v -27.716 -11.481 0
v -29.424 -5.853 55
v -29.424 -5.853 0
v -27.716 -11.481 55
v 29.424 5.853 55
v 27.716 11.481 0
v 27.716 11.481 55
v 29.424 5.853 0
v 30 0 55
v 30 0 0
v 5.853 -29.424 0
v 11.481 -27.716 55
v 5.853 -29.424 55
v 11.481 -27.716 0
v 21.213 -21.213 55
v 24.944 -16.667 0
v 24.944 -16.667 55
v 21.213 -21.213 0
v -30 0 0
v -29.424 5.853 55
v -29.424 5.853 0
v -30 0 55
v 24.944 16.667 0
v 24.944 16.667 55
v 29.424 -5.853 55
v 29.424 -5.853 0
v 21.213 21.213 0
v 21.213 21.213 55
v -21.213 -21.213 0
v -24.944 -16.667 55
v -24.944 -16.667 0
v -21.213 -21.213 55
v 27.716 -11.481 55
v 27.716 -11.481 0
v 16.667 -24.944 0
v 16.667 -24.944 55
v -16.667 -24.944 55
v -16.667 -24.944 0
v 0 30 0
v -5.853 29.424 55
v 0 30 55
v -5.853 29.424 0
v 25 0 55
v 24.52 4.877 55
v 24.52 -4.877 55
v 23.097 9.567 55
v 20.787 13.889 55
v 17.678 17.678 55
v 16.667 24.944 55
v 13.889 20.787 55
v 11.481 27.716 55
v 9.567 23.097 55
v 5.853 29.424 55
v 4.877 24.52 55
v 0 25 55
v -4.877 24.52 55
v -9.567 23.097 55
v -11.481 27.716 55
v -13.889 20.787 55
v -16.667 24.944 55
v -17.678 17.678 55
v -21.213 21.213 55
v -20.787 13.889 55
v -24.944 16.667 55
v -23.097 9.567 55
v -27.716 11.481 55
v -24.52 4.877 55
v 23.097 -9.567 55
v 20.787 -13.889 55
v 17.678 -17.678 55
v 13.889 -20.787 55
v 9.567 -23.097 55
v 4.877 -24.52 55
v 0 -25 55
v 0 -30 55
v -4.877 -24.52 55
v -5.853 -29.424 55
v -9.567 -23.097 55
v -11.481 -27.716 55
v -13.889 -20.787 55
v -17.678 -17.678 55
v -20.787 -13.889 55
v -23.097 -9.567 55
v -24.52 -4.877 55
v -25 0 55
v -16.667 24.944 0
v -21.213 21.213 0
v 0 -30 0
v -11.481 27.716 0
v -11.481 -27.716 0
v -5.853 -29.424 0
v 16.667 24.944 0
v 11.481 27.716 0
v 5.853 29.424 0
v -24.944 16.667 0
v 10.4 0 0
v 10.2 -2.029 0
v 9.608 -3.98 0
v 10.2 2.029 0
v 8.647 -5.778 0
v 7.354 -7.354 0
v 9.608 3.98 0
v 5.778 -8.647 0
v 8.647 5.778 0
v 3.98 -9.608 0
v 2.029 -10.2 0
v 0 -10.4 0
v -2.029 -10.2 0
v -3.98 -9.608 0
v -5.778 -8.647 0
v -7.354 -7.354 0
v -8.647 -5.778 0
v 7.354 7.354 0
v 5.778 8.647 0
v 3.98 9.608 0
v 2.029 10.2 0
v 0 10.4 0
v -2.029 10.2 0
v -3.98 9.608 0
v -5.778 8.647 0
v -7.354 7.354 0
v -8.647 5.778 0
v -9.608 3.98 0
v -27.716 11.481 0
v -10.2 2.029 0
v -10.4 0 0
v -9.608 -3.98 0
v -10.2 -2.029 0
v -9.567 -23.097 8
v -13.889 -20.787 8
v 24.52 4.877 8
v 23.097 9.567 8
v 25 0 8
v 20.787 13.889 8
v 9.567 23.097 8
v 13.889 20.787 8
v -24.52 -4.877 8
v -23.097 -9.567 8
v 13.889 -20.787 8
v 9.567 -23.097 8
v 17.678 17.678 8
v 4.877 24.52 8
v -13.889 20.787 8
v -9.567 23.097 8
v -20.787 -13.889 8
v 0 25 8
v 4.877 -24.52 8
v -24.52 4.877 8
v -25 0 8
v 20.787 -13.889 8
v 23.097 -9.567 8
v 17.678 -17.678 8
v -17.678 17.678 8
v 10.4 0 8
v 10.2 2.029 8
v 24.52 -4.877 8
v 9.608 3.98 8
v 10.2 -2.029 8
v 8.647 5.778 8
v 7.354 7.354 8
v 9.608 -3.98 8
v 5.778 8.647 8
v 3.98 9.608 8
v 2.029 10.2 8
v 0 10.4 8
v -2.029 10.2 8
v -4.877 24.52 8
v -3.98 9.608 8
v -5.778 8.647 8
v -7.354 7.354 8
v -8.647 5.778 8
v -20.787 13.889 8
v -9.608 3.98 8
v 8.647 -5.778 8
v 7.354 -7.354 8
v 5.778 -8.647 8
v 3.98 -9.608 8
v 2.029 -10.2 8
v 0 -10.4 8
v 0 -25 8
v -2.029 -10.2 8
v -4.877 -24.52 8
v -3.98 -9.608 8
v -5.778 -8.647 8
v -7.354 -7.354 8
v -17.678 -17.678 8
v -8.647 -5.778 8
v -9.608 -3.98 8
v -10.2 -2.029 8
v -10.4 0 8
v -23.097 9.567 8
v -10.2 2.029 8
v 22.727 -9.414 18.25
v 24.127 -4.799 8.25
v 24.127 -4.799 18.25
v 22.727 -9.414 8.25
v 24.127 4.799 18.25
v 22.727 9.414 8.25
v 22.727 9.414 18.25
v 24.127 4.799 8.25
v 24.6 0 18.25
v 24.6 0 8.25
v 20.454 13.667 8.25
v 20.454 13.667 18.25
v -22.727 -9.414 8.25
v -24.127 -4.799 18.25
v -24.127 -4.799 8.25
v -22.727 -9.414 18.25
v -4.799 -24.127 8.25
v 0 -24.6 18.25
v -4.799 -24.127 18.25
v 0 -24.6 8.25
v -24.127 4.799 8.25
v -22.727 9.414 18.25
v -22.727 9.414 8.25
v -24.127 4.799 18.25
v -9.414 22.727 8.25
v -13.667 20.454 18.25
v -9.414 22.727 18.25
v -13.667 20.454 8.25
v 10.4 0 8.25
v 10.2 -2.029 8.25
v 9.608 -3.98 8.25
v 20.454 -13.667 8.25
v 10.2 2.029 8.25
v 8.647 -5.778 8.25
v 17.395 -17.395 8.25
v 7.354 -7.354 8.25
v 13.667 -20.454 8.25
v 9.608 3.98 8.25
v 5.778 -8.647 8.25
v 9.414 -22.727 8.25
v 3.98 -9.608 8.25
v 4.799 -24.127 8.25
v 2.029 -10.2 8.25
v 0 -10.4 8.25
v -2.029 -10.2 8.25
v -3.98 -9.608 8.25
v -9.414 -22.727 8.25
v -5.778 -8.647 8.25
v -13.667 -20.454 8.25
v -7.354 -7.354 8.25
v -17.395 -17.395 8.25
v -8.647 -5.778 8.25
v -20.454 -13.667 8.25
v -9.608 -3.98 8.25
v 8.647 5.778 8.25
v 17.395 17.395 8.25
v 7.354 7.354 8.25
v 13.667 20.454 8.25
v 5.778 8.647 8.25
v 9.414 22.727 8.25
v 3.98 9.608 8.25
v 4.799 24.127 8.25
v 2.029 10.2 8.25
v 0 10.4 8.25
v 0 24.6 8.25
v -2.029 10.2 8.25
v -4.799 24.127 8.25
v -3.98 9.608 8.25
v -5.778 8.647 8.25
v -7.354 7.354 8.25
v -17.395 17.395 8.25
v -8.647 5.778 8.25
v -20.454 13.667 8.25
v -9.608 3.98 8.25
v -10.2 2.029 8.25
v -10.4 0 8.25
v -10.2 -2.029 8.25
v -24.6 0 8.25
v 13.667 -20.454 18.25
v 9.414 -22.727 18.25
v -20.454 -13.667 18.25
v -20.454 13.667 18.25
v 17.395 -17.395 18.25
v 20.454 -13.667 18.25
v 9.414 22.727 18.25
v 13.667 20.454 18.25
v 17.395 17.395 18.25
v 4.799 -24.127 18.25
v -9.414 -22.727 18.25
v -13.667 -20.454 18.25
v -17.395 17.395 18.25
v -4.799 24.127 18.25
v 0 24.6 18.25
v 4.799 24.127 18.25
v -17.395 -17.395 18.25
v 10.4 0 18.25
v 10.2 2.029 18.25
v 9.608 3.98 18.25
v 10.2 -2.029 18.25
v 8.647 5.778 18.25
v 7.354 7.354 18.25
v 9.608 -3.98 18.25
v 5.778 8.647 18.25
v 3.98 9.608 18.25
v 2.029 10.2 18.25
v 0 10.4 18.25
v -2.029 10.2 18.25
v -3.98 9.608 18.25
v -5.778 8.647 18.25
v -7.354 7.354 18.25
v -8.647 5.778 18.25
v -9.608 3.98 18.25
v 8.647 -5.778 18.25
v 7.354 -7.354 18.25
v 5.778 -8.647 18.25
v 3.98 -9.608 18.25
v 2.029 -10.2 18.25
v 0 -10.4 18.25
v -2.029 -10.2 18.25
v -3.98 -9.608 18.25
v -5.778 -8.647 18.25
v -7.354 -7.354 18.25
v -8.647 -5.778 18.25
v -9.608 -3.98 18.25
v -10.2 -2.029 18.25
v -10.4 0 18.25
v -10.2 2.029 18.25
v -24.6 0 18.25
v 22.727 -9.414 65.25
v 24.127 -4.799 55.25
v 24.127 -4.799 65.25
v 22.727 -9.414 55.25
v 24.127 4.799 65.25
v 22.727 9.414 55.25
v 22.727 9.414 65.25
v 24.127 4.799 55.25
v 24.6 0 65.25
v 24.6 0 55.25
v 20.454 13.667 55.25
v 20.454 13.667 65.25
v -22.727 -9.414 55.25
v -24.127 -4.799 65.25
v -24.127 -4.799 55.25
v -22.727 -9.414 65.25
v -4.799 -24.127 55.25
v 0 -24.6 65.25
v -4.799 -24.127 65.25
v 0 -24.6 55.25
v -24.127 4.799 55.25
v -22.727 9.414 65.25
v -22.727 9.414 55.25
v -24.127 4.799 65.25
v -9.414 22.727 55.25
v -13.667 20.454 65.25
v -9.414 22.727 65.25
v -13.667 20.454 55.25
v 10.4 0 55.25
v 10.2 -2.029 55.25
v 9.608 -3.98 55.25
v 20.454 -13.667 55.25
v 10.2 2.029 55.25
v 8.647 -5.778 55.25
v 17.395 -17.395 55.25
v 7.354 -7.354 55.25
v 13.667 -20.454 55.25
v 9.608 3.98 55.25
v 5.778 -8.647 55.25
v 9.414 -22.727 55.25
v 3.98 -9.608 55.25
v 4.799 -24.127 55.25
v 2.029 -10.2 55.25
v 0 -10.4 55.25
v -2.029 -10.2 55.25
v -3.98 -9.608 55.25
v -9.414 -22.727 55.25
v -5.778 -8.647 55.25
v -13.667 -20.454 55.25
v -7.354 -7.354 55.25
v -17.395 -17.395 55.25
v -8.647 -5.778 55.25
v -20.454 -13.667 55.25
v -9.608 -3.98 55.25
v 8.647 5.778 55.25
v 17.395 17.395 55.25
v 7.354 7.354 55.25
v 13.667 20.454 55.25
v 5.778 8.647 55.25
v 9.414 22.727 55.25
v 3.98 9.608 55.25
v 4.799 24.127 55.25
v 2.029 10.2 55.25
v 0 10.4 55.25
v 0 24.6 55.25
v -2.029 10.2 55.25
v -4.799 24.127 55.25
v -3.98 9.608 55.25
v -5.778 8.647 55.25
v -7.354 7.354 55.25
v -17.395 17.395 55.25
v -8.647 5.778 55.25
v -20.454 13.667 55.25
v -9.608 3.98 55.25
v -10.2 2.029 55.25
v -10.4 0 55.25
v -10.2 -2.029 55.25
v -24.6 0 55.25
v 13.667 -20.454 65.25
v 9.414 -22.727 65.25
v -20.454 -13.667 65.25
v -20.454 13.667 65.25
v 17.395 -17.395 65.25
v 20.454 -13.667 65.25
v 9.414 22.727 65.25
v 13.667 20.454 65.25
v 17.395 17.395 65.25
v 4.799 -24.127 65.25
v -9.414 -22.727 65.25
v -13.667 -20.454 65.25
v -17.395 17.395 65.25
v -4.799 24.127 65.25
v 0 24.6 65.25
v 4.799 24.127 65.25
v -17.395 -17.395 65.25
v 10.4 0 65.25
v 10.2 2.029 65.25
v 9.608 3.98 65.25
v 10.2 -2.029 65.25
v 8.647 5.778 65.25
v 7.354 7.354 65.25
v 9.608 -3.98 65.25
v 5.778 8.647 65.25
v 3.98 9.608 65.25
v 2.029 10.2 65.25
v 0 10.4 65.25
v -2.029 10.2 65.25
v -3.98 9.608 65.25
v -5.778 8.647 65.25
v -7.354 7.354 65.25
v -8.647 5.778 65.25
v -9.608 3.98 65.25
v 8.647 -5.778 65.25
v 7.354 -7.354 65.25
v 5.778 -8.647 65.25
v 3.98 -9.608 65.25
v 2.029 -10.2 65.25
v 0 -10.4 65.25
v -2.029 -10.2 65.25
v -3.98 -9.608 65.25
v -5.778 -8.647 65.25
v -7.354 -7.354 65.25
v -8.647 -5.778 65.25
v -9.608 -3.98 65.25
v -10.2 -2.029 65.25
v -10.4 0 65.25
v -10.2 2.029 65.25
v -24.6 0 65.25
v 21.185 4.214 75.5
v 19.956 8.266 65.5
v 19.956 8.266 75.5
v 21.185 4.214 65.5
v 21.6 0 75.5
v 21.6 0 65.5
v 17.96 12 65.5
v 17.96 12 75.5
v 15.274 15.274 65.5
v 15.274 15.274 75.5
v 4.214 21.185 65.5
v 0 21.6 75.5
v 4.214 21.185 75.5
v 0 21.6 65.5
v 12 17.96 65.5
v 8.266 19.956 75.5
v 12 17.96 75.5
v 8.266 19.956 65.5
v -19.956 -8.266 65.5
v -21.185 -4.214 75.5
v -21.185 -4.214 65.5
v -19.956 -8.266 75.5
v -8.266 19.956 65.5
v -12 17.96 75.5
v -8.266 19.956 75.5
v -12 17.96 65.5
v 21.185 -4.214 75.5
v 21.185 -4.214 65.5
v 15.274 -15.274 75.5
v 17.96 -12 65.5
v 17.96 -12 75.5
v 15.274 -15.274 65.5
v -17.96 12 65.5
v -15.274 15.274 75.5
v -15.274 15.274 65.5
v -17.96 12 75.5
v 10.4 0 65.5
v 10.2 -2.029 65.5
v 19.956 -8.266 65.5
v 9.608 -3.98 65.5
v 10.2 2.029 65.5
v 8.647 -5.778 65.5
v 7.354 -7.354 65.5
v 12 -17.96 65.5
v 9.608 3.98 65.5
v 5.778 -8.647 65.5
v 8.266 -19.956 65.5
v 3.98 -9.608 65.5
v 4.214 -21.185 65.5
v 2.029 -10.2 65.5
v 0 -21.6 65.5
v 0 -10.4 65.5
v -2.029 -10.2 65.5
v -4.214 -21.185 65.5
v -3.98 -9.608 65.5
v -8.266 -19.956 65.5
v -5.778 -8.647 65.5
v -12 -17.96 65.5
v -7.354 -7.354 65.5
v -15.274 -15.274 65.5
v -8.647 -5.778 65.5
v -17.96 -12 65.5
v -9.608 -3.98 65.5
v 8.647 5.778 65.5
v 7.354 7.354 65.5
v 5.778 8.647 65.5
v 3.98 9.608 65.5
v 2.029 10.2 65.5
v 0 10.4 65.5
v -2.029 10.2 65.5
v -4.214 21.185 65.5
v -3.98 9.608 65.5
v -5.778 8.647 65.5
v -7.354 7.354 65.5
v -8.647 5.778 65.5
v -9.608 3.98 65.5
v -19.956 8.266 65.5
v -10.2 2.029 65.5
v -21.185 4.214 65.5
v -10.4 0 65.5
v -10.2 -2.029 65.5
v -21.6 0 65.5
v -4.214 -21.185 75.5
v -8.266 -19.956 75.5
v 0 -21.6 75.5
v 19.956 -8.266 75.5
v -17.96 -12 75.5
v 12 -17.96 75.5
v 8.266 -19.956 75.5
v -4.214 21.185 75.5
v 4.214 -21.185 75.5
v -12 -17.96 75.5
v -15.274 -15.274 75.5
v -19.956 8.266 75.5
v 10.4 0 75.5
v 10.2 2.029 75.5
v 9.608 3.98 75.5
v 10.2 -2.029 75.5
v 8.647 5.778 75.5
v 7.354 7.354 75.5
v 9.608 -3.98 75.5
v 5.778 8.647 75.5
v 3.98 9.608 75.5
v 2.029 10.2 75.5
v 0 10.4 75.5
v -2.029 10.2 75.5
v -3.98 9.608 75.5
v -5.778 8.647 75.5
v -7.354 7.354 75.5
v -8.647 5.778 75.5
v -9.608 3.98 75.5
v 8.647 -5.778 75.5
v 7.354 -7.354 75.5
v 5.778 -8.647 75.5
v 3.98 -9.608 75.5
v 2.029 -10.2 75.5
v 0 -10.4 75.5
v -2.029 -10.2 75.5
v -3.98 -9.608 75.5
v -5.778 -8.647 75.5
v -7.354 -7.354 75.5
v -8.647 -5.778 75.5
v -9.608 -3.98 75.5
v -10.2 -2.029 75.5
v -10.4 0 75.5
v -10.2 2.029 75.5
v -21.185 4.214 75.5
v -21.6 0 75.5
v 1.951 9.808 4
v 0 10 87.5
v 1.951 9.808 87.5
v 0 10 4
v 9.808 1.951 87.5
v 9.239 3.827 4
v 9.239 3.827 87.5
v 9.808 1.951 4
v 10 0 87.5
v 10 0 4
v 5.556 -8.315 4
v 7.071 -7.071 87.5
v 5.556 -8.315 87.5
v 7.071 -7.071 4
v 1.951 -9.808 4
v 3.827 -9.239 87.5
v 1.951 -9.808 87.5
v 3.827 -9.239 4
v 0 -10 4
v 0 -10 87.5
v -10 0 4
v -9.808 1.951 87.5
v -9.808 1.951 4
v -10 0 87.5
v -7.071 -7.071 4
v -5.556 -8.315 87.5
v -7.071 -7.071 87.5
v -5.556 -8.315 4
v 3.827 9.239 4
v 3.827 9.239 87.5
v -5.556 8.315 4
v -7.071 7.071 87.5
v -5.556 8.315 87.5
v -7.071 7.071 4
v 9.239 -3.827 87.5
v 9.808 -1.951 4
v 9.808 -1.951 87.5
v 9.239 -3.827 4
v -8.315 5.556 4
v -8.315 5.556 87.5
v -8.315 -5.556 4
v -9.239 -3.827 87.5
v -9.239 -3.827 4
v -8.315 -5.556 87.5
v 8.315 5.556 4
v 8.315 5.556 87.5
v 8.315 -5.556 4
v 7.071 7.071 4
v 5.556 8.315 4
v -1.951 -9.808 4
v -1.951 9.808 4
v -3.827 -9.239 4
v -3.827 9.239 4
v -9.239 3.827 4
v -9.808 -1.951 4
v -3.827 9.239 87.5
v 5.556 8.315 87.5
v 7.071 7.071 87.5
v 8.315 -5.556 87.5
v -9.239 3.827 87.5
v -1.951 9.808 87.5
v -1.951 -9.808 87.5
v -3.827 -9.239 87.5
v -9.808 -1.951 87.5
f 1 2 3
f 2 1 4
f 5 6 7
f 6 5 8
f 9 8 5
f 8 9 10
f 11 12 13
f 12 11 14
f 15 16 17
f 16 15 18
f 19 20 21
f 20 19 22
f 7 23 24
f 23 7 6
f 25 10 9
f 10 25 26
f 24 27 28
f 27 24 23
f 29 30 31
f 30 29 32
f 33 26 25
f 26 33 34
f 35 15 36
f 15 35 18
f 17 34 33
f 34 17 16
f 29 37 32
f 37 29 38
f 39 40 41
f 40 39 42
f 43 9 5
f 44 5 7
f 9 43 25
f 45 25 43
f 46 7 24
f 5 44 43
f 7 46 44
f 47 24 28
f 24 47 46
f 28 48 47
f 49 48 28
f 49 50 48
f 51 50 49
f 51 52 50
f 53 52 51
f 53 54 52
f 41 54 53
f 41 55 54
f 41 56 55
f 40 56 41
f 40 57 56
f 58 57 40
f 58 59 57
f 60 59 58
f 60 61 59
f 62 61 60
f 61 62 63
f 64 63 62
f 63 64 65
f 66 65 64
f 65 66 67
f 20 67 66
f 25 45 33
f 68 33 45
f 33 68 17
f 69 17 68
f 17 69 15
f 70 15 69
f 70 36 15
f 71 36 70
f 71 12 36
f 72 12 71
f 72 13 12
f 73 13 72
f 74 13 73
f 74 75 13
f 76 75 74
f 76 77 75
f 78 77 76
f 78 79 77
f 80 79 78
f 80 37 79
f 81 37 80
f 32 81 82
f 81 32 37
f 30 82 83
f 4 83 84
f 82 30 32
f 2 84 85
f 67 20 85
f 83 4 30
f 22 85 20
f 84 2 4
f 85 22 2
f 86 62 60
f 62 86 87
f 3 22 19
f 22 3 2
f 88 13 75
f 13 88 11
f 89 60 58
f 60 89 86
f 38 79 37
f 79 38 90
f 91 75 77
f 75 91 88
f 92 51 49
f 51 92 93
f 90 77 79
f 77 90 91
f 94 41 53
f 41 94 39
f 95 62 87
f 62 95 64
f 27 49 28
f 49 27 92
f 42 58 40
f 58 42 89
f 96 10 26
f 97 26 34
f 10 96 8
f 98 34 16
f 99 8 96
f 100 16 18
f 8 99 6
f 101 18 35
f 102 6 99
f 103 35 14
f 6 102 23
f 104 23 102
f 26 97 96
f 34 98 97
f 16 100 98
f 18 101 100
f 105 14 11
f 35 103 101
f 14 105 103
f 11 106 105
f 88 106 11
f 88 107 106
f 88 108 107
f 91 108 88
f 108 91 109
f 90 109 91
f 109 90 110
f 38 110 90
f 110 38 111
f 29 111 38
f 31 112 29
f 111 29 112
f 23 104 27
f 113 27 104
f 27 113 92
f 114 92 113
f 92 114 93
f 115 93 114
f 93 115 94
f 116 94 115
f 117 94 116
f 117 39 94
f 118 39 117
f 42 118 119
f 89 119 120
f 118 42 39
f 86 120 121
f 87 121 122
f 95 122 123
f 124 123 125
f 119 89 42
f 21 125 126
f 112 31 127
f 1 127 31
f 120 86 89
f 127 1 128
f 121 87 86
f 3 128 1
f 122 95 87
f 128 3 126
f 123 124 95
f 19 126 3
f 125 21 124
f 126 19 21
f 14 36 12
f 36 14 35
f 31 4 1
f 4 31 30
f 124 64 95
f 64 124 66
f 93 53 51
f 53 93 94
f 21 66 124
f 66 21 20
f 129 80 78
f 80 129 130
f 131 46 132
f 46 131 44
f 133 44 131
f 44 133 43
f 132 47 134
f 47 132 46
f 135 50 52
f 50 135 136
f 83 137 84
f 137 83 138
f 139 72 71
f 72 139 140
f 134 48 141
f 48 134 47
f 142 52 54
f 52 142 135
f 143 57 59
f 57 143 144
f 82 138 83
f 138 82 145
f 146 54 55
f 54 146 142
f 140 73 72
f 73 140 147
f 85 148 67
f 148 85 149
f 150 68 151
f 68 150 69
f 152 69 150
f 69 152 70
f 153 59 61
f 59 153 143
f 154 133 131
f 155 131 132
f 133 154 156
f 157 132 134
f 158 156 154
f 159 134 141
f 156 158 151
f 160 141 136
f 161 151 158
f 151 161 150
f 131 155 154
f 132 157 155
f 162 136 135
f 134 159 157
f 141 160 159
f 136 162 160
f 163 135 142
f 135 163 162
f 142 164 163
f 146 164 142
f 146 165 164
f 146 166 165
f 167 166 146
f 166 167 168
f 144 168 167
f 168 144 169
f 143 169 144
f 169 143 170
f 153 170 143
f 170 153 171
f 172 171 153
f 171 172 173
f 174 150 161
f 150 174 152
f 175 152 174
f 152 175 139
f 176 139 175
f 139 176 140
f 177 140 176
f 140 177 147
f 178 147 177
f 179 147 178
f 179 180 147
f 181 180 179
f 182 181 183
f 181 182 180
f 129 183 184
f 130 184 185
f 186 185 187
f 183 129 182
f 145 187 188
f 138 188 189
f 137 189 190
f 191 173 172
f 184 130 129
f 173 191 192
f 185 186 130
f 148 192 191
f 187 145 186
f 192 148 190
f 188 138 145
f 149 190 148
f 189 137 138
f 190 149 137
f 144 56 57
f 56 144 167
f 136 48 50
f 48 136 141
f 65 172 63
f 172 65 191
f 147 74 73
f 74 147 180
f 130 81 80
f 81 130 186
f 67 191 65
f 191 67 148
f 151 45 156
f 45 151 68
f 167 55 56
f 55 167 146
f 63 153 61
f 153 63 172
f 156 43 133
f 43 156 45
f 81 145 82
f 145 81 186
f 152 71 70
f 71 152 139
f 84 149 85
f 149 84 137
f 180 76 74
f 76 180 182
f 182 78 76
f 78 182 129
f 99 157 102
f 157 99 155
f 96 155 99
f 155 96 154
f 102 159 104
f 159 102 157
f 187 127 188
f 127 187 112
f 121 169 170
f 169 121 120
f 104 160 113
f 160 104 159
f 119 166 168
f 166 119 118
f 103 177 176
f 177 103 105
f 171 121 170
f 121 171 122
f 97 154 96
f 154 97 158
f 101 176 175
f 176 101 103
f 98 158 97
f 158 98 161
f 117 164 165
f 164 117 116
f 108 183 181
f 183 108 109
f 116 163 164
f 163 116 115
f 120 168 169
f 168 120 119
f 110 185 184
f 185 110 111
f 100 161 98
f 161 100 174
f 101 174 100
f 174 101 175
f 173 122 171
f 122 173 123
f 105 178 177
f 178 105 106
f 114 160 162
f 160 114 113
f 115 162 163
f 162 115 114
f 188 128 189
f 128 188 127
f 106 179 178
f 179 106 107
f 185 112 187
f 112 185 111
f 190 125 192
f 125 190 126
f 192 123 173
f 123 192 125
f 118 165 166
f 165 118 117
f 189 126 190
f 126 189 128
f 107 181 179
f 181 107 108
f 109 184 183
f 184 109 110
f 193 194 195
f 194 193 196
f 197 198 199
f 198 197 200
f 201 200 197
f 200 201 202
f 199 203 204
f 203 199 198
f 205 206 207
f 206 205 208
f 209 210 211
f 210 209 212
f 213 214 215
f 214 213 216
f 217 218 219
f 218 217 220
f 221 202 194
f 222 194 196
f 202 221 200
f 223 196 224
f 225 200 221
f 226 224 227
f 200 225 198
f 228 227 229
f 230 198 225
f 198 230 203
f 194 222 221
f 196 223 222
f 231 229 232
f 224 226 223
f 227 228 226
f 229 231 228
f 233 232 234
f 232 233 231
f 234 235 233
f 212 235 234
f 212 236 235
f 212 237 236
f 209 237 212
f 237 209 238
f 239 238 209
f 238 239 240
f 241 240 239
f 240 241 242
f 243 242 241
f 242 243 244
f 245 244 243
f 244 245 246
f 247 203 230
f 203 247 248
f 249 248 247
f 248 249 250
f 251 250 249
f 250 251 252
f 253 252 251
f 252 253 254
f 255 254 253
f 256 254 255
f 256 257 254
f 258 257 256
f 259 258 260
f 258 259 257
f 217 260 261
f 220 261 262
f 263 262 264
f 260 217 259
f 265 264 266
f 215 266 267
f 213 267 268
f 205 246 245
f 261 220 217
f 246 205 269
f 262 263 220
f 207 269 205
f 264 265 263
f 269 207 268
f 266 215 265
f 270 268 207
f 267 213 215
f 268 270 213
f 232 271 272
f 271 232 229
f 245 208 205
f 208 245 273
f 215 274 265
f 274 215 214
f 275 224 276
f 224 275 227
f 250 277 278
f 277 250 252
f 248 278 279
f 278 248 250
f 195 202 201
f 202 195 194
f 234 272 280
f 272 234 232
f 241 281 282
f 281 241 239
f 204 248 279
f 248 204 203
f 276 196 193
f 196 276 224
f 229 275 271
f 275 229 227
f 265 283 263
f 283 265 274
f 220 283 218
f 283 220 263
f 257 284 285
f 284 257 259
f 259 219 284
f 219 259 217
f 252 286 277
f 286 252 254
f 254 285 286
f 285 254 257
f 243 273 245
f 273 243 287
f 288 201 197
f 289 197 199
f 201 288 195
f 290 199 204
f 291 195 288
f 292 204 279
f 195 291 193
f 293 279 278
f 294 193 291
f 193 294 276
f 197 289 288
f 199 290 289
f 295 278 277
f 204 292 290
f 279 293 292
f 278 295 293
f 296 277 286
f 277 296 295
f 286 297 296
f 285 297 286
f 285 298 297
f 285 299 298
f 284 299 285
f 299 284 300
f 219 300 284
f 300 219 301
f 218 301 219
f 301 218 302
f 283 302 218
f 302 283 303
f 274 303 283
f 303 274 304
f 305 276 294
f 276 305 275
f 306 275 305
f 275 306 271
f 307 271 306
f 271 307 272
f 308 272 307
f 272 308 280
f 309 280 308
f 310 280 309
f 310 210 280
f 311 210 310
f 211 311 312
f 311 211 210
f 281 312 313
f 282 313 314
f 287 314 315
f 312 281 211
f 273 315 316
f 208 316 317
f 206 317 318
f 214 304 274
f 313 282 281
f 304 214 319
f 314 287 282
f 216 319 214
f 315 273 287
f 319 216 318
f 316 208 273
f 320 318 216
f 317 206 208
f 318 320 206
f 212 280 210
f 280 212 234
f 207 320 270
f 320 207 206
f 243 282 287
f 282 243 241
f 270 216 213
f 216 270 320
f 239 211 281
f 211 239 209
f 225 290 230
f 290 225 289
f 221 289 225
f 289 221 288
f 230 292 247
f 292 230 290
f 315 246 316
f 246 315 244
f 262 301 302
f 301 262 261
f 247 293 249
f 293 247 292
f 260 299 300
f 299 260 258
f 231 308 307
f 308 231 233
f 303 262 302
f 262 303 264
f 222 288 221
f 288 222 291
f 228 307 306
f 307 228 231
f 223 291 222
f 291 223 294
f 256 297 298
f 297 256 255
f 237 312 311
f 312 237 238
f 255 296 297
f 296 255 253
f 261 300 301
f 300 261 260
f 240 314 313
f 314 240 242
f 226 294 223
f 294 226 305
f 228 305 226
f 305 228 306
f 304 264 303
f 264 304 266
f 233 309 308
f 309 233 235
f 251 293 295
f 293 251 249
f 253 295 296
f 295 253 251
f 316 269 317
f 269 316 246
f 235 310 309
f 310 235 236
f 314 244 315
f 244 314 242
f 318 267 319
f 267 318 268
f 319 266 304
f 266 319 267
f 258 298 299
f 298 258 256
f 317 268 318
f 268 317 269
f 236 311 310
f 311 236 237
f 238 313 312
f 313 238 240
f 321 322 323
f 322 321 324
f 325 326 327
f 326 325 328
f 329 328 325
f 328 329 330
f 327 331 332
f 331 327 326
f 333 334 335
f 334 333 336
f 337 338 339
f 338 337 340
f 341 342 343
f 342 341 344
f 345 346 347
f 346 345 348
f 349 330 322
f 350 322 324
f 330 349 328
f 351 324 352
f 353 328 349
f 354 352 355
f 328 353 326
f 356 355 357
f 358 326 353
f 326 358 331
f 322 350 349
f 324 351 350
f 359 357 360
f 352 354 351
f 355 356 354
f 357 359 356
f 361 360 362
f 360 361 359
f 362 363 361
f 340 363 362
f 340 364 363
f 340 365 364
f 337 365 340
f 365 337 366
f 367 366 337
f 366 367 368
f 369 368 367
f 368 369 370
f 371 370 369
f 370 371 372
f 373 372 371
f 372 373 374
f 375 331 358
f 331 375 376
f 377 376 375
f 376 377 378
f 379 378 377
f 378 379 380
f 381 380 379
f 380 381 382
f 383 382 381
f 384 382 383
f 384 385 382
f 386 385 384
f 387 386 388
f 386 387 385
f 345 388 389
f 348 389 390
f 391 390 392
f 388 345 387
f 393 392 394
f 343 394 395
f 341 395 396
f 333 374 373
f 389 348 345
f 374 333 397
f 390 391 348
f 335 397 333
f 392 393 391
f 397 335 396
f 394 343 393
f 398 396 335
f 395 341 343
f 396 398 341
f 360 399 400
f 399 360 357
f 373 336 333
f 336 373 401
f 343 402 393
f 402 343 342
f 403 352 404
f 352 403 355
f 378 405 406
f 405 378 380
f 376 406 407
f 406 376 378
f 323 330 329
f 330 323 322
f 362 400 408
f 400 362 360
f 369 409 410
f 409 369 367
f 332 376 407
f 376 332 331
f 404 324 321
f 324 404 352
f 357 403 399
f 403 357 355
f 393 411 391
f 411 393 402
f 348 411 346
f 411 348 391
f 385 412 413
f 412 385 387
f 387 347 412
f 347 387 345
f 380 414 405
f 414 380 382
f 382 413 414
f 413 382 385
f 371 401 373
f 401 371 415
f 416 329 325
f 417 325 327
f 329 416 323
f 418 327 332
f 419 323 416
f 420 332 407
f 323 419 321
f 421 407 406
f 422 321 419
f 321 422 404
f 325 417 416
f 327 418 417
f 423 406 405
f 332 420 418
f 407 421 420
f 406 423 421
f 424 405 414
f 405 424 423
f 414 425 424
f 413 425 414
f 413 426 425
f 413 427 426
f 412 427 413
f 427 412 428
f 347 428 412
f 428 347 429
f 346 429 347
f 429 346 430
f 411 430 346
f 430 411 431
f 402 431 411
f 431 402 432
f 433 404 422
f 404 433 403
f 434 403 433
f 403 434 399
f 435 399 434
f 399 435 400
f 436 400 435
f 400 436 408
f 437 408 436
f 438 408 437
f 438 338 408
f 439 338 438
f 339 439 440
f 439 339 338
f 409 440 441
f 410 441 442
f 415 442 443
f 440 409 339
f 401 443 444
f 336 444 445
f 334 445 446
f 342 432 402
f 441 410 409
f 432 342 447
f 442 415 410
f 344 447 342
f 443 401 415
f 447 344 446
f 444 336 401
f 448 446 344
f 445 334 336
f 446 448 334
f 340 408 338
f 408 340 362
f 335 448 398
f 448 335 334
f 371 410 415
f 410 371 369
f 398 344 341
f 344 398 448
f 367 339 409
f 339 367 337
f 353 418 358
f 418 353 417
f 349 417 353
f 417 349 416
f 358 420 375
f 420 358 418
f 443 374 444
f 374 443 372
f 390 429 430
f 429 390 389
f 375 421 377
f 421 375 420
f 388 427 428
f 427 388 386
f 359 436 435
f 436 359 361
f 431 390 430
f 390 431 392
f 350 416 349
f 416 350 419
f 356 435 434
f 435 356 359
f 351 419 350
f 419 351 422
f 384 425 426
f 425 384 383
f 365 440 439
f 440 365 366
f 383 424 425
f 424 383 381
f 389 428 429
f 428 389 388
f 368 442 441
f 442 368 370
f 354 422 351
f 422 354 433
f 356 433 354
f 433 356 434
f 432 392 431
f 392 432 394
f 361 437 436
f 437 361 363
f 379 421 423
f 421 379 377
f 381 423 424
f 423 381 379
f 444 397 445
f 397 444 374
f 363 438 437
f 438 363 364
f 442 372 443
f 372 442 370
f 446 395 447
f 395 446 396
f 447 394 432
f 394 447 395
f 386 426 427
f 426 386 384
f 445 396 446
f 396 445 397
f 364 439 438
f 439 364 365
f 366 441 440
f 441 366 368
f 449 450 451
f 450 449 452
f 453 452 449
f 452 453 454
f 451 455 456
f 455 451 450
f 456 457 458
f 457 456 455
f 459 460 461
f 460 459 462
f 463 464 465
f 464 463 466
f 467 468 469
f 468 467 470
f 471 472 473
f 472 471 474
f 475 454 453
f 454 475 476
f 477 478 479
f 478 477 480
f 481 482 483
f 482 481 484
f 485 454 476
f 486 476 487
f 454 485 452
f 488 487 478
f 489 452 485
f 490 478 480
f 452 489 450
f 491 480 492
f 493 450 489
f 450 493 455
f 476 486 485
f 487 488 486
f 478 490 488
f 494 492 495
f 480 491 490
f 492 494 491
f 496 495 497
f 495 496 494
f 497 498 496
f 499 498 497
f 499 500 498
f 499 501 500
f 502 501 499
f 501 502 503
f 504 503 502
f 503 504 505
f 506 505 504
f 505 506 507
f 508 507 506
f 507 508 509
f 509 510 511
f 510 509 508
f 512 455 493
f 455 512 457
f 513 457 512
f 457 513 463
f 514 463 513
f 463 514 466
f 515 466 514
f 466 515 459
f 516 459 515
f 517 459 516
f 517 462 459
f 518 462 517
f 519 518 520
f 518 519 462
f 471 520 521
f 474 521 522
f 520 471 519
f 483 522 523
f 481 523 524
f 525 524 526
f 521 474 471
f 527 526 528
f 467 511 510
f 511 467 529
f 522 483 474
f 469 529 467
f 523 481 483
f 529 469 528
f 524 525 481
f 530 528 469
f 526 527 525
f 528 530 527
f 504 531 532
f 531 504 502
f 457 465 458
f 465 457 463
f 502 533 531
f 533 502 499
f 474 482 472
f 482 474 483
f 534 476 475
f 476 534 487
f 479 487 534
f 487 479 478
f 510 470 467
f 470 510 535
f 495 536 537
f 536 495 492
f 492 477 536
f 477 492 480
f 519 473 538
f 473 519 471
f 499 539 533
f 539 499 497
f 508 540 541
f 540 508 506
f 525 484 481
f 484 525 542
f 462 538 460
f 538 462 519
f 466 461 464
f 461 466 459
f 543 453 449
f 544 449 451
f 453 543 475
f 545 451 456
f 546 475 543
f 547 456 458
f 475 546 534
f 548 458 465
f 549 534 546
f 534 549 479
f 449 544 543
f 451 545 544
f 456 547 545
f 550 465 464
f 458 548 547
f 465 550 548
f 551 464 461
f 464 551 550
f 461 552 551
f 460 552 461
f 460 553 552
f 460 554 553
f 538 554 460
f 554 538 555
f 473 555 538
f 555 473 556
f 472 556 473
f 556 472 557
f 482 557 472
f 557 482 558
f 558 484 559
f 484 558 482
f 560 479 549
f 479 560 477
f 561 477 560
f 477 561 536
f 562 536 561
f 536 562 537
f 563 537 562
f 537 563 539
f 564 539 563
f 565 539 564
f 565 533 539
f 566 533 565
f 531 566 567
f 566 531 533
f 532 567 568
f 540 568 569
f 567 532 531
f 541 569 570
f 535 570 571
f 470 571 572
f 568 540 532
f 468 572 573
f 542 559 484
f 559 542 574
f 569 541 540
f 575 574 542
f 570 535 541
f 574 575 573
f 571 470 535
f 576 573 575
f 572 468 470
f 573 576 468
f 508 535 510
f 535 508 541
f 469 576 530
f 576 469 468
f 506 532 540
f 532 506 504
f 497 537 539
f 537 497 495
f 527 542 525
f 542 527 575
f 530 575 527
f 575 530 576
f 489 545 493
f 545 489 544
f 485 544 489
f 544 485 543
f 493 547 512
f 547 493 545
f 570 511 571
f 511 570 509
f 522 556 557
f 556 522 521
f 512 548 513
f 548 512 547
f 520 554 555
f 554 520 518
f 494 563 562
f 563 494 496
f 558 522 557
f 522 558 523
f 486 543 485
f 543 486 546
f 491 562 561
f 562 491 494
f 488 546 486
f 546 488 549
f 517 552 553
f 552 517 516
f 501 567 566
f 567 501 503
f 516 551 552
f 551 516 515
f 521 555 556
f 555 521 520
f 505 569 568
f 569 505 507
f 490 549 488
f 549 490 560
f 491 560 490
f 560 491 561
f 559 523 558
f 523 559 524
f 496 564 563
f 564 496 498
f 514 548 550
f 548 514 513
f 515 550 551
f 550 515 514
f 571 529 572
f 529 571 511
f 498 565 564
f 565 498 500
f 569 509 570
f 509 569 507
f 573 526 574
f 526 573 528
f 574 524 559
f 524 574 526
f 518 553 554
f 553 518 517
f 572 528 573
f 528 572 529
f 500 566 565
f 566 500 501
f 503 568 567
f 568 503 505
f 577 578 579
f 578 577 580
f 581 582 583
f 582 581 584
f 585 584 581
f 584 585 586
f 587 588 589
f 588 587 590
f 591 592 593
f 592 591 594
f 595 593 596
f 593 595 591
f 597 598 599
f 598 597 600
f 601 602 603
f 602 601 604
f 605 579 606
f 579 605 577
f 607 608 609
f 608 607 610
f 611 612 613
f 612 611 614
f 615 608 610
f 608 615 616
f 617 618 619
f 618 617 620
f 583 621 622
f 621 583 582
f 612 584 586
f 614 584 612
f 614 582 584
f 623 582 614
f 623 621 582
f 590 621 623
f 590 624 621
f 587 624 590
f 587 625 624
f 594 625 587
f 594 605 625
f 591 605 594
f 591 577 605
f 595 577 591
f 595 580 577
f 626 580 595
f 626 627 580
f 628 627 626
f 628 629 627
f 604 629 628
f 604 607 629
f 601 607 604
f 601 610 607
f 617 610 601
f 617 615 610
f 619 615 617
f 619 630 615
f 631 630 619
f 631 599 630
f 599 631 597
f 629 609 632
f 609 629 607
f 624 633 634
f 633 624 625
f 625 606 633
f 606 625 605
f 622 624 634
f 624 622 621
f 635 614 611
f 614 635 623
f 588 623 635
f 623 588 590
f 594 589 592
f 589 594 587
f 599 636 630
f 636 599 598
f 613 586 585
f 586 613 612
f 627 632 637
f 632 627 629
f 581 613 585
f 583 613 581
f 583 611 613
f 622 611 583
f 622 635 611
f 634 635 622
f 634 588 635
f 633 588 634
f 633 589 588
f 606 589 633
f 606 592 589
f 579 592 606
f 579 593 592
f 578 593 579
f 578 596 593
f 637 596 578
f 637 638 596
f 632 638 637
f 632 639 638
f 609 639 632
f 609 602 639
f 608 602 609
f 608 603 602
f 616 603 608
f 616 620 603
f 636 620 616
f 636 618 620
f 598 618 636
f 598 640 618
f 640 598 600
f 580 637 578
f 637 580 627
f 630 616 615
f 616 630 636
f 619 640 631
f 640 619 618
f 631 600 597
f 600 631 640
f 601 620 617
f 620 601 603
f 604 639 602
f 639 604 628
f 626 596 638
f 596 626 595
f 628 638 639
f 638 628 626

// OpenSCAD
$fn = 32;

// ------------------------------------------------------------------------
// Bearing housing: housing d60, two bearings and a shaft
// Every part is its own module, assembly() places them once.
// ------------------------------------------------------------------------

// --- part 1 ---
module housing() {
  difference() {
    cylinder(h = 55, d = 60);
    translate([0, 0, 8]) cylinder(h = 48, d = 50);
    translate([0, 0, -1]) cylinder(h = 10, d = 20.8);
  }
}

// --- part 2 ---
module bearing_lower() {
  difference() {
      translate([0, 0, 0]) cylinder(h = 10, d = 49.2);
      translate([0, 0, -1]) cylinder(h = 12, d = 20.8);
    }
}

// --- part 3 ---
module bearing_upper() {
  difference() {
      translate([0, 0, 0]) cylinder(h = 10, d = 49.2);
      translate([0, 0, -1]) cylinder(h = 12, d = 20.8);
    }
}

// --- part 4 ---
module spacer() {
  difference() {
      translate([0, 0, 0]) cylinder(h = 10, d = 43.2);
      translate([0, 0, -1]) cylinder(h = 12, d = 20.8);
    }
}

// --- part 5 ---
module shaft() {
  translate([0, 0, -41.75]) cylinder(h = 83.5, d = 20);
}

// --- assembly ---
module assembly() {
  translate([0, 0, 0]) rotate([0, 0, 0]) housing();
  translate([0, 0, 8.25]) rotate([0, 0, 0]) bearing_lower();
  translate([0, 0, 55.25]) rotate([0, 0, 0]) bearing_upper();
  translate([0, 0, 65.5]) rotate([0, 0, 0]) spacer();
  translate([0, 0, 45.75]) rotate([0, 0, 0]) shaft();
}

assembly();
